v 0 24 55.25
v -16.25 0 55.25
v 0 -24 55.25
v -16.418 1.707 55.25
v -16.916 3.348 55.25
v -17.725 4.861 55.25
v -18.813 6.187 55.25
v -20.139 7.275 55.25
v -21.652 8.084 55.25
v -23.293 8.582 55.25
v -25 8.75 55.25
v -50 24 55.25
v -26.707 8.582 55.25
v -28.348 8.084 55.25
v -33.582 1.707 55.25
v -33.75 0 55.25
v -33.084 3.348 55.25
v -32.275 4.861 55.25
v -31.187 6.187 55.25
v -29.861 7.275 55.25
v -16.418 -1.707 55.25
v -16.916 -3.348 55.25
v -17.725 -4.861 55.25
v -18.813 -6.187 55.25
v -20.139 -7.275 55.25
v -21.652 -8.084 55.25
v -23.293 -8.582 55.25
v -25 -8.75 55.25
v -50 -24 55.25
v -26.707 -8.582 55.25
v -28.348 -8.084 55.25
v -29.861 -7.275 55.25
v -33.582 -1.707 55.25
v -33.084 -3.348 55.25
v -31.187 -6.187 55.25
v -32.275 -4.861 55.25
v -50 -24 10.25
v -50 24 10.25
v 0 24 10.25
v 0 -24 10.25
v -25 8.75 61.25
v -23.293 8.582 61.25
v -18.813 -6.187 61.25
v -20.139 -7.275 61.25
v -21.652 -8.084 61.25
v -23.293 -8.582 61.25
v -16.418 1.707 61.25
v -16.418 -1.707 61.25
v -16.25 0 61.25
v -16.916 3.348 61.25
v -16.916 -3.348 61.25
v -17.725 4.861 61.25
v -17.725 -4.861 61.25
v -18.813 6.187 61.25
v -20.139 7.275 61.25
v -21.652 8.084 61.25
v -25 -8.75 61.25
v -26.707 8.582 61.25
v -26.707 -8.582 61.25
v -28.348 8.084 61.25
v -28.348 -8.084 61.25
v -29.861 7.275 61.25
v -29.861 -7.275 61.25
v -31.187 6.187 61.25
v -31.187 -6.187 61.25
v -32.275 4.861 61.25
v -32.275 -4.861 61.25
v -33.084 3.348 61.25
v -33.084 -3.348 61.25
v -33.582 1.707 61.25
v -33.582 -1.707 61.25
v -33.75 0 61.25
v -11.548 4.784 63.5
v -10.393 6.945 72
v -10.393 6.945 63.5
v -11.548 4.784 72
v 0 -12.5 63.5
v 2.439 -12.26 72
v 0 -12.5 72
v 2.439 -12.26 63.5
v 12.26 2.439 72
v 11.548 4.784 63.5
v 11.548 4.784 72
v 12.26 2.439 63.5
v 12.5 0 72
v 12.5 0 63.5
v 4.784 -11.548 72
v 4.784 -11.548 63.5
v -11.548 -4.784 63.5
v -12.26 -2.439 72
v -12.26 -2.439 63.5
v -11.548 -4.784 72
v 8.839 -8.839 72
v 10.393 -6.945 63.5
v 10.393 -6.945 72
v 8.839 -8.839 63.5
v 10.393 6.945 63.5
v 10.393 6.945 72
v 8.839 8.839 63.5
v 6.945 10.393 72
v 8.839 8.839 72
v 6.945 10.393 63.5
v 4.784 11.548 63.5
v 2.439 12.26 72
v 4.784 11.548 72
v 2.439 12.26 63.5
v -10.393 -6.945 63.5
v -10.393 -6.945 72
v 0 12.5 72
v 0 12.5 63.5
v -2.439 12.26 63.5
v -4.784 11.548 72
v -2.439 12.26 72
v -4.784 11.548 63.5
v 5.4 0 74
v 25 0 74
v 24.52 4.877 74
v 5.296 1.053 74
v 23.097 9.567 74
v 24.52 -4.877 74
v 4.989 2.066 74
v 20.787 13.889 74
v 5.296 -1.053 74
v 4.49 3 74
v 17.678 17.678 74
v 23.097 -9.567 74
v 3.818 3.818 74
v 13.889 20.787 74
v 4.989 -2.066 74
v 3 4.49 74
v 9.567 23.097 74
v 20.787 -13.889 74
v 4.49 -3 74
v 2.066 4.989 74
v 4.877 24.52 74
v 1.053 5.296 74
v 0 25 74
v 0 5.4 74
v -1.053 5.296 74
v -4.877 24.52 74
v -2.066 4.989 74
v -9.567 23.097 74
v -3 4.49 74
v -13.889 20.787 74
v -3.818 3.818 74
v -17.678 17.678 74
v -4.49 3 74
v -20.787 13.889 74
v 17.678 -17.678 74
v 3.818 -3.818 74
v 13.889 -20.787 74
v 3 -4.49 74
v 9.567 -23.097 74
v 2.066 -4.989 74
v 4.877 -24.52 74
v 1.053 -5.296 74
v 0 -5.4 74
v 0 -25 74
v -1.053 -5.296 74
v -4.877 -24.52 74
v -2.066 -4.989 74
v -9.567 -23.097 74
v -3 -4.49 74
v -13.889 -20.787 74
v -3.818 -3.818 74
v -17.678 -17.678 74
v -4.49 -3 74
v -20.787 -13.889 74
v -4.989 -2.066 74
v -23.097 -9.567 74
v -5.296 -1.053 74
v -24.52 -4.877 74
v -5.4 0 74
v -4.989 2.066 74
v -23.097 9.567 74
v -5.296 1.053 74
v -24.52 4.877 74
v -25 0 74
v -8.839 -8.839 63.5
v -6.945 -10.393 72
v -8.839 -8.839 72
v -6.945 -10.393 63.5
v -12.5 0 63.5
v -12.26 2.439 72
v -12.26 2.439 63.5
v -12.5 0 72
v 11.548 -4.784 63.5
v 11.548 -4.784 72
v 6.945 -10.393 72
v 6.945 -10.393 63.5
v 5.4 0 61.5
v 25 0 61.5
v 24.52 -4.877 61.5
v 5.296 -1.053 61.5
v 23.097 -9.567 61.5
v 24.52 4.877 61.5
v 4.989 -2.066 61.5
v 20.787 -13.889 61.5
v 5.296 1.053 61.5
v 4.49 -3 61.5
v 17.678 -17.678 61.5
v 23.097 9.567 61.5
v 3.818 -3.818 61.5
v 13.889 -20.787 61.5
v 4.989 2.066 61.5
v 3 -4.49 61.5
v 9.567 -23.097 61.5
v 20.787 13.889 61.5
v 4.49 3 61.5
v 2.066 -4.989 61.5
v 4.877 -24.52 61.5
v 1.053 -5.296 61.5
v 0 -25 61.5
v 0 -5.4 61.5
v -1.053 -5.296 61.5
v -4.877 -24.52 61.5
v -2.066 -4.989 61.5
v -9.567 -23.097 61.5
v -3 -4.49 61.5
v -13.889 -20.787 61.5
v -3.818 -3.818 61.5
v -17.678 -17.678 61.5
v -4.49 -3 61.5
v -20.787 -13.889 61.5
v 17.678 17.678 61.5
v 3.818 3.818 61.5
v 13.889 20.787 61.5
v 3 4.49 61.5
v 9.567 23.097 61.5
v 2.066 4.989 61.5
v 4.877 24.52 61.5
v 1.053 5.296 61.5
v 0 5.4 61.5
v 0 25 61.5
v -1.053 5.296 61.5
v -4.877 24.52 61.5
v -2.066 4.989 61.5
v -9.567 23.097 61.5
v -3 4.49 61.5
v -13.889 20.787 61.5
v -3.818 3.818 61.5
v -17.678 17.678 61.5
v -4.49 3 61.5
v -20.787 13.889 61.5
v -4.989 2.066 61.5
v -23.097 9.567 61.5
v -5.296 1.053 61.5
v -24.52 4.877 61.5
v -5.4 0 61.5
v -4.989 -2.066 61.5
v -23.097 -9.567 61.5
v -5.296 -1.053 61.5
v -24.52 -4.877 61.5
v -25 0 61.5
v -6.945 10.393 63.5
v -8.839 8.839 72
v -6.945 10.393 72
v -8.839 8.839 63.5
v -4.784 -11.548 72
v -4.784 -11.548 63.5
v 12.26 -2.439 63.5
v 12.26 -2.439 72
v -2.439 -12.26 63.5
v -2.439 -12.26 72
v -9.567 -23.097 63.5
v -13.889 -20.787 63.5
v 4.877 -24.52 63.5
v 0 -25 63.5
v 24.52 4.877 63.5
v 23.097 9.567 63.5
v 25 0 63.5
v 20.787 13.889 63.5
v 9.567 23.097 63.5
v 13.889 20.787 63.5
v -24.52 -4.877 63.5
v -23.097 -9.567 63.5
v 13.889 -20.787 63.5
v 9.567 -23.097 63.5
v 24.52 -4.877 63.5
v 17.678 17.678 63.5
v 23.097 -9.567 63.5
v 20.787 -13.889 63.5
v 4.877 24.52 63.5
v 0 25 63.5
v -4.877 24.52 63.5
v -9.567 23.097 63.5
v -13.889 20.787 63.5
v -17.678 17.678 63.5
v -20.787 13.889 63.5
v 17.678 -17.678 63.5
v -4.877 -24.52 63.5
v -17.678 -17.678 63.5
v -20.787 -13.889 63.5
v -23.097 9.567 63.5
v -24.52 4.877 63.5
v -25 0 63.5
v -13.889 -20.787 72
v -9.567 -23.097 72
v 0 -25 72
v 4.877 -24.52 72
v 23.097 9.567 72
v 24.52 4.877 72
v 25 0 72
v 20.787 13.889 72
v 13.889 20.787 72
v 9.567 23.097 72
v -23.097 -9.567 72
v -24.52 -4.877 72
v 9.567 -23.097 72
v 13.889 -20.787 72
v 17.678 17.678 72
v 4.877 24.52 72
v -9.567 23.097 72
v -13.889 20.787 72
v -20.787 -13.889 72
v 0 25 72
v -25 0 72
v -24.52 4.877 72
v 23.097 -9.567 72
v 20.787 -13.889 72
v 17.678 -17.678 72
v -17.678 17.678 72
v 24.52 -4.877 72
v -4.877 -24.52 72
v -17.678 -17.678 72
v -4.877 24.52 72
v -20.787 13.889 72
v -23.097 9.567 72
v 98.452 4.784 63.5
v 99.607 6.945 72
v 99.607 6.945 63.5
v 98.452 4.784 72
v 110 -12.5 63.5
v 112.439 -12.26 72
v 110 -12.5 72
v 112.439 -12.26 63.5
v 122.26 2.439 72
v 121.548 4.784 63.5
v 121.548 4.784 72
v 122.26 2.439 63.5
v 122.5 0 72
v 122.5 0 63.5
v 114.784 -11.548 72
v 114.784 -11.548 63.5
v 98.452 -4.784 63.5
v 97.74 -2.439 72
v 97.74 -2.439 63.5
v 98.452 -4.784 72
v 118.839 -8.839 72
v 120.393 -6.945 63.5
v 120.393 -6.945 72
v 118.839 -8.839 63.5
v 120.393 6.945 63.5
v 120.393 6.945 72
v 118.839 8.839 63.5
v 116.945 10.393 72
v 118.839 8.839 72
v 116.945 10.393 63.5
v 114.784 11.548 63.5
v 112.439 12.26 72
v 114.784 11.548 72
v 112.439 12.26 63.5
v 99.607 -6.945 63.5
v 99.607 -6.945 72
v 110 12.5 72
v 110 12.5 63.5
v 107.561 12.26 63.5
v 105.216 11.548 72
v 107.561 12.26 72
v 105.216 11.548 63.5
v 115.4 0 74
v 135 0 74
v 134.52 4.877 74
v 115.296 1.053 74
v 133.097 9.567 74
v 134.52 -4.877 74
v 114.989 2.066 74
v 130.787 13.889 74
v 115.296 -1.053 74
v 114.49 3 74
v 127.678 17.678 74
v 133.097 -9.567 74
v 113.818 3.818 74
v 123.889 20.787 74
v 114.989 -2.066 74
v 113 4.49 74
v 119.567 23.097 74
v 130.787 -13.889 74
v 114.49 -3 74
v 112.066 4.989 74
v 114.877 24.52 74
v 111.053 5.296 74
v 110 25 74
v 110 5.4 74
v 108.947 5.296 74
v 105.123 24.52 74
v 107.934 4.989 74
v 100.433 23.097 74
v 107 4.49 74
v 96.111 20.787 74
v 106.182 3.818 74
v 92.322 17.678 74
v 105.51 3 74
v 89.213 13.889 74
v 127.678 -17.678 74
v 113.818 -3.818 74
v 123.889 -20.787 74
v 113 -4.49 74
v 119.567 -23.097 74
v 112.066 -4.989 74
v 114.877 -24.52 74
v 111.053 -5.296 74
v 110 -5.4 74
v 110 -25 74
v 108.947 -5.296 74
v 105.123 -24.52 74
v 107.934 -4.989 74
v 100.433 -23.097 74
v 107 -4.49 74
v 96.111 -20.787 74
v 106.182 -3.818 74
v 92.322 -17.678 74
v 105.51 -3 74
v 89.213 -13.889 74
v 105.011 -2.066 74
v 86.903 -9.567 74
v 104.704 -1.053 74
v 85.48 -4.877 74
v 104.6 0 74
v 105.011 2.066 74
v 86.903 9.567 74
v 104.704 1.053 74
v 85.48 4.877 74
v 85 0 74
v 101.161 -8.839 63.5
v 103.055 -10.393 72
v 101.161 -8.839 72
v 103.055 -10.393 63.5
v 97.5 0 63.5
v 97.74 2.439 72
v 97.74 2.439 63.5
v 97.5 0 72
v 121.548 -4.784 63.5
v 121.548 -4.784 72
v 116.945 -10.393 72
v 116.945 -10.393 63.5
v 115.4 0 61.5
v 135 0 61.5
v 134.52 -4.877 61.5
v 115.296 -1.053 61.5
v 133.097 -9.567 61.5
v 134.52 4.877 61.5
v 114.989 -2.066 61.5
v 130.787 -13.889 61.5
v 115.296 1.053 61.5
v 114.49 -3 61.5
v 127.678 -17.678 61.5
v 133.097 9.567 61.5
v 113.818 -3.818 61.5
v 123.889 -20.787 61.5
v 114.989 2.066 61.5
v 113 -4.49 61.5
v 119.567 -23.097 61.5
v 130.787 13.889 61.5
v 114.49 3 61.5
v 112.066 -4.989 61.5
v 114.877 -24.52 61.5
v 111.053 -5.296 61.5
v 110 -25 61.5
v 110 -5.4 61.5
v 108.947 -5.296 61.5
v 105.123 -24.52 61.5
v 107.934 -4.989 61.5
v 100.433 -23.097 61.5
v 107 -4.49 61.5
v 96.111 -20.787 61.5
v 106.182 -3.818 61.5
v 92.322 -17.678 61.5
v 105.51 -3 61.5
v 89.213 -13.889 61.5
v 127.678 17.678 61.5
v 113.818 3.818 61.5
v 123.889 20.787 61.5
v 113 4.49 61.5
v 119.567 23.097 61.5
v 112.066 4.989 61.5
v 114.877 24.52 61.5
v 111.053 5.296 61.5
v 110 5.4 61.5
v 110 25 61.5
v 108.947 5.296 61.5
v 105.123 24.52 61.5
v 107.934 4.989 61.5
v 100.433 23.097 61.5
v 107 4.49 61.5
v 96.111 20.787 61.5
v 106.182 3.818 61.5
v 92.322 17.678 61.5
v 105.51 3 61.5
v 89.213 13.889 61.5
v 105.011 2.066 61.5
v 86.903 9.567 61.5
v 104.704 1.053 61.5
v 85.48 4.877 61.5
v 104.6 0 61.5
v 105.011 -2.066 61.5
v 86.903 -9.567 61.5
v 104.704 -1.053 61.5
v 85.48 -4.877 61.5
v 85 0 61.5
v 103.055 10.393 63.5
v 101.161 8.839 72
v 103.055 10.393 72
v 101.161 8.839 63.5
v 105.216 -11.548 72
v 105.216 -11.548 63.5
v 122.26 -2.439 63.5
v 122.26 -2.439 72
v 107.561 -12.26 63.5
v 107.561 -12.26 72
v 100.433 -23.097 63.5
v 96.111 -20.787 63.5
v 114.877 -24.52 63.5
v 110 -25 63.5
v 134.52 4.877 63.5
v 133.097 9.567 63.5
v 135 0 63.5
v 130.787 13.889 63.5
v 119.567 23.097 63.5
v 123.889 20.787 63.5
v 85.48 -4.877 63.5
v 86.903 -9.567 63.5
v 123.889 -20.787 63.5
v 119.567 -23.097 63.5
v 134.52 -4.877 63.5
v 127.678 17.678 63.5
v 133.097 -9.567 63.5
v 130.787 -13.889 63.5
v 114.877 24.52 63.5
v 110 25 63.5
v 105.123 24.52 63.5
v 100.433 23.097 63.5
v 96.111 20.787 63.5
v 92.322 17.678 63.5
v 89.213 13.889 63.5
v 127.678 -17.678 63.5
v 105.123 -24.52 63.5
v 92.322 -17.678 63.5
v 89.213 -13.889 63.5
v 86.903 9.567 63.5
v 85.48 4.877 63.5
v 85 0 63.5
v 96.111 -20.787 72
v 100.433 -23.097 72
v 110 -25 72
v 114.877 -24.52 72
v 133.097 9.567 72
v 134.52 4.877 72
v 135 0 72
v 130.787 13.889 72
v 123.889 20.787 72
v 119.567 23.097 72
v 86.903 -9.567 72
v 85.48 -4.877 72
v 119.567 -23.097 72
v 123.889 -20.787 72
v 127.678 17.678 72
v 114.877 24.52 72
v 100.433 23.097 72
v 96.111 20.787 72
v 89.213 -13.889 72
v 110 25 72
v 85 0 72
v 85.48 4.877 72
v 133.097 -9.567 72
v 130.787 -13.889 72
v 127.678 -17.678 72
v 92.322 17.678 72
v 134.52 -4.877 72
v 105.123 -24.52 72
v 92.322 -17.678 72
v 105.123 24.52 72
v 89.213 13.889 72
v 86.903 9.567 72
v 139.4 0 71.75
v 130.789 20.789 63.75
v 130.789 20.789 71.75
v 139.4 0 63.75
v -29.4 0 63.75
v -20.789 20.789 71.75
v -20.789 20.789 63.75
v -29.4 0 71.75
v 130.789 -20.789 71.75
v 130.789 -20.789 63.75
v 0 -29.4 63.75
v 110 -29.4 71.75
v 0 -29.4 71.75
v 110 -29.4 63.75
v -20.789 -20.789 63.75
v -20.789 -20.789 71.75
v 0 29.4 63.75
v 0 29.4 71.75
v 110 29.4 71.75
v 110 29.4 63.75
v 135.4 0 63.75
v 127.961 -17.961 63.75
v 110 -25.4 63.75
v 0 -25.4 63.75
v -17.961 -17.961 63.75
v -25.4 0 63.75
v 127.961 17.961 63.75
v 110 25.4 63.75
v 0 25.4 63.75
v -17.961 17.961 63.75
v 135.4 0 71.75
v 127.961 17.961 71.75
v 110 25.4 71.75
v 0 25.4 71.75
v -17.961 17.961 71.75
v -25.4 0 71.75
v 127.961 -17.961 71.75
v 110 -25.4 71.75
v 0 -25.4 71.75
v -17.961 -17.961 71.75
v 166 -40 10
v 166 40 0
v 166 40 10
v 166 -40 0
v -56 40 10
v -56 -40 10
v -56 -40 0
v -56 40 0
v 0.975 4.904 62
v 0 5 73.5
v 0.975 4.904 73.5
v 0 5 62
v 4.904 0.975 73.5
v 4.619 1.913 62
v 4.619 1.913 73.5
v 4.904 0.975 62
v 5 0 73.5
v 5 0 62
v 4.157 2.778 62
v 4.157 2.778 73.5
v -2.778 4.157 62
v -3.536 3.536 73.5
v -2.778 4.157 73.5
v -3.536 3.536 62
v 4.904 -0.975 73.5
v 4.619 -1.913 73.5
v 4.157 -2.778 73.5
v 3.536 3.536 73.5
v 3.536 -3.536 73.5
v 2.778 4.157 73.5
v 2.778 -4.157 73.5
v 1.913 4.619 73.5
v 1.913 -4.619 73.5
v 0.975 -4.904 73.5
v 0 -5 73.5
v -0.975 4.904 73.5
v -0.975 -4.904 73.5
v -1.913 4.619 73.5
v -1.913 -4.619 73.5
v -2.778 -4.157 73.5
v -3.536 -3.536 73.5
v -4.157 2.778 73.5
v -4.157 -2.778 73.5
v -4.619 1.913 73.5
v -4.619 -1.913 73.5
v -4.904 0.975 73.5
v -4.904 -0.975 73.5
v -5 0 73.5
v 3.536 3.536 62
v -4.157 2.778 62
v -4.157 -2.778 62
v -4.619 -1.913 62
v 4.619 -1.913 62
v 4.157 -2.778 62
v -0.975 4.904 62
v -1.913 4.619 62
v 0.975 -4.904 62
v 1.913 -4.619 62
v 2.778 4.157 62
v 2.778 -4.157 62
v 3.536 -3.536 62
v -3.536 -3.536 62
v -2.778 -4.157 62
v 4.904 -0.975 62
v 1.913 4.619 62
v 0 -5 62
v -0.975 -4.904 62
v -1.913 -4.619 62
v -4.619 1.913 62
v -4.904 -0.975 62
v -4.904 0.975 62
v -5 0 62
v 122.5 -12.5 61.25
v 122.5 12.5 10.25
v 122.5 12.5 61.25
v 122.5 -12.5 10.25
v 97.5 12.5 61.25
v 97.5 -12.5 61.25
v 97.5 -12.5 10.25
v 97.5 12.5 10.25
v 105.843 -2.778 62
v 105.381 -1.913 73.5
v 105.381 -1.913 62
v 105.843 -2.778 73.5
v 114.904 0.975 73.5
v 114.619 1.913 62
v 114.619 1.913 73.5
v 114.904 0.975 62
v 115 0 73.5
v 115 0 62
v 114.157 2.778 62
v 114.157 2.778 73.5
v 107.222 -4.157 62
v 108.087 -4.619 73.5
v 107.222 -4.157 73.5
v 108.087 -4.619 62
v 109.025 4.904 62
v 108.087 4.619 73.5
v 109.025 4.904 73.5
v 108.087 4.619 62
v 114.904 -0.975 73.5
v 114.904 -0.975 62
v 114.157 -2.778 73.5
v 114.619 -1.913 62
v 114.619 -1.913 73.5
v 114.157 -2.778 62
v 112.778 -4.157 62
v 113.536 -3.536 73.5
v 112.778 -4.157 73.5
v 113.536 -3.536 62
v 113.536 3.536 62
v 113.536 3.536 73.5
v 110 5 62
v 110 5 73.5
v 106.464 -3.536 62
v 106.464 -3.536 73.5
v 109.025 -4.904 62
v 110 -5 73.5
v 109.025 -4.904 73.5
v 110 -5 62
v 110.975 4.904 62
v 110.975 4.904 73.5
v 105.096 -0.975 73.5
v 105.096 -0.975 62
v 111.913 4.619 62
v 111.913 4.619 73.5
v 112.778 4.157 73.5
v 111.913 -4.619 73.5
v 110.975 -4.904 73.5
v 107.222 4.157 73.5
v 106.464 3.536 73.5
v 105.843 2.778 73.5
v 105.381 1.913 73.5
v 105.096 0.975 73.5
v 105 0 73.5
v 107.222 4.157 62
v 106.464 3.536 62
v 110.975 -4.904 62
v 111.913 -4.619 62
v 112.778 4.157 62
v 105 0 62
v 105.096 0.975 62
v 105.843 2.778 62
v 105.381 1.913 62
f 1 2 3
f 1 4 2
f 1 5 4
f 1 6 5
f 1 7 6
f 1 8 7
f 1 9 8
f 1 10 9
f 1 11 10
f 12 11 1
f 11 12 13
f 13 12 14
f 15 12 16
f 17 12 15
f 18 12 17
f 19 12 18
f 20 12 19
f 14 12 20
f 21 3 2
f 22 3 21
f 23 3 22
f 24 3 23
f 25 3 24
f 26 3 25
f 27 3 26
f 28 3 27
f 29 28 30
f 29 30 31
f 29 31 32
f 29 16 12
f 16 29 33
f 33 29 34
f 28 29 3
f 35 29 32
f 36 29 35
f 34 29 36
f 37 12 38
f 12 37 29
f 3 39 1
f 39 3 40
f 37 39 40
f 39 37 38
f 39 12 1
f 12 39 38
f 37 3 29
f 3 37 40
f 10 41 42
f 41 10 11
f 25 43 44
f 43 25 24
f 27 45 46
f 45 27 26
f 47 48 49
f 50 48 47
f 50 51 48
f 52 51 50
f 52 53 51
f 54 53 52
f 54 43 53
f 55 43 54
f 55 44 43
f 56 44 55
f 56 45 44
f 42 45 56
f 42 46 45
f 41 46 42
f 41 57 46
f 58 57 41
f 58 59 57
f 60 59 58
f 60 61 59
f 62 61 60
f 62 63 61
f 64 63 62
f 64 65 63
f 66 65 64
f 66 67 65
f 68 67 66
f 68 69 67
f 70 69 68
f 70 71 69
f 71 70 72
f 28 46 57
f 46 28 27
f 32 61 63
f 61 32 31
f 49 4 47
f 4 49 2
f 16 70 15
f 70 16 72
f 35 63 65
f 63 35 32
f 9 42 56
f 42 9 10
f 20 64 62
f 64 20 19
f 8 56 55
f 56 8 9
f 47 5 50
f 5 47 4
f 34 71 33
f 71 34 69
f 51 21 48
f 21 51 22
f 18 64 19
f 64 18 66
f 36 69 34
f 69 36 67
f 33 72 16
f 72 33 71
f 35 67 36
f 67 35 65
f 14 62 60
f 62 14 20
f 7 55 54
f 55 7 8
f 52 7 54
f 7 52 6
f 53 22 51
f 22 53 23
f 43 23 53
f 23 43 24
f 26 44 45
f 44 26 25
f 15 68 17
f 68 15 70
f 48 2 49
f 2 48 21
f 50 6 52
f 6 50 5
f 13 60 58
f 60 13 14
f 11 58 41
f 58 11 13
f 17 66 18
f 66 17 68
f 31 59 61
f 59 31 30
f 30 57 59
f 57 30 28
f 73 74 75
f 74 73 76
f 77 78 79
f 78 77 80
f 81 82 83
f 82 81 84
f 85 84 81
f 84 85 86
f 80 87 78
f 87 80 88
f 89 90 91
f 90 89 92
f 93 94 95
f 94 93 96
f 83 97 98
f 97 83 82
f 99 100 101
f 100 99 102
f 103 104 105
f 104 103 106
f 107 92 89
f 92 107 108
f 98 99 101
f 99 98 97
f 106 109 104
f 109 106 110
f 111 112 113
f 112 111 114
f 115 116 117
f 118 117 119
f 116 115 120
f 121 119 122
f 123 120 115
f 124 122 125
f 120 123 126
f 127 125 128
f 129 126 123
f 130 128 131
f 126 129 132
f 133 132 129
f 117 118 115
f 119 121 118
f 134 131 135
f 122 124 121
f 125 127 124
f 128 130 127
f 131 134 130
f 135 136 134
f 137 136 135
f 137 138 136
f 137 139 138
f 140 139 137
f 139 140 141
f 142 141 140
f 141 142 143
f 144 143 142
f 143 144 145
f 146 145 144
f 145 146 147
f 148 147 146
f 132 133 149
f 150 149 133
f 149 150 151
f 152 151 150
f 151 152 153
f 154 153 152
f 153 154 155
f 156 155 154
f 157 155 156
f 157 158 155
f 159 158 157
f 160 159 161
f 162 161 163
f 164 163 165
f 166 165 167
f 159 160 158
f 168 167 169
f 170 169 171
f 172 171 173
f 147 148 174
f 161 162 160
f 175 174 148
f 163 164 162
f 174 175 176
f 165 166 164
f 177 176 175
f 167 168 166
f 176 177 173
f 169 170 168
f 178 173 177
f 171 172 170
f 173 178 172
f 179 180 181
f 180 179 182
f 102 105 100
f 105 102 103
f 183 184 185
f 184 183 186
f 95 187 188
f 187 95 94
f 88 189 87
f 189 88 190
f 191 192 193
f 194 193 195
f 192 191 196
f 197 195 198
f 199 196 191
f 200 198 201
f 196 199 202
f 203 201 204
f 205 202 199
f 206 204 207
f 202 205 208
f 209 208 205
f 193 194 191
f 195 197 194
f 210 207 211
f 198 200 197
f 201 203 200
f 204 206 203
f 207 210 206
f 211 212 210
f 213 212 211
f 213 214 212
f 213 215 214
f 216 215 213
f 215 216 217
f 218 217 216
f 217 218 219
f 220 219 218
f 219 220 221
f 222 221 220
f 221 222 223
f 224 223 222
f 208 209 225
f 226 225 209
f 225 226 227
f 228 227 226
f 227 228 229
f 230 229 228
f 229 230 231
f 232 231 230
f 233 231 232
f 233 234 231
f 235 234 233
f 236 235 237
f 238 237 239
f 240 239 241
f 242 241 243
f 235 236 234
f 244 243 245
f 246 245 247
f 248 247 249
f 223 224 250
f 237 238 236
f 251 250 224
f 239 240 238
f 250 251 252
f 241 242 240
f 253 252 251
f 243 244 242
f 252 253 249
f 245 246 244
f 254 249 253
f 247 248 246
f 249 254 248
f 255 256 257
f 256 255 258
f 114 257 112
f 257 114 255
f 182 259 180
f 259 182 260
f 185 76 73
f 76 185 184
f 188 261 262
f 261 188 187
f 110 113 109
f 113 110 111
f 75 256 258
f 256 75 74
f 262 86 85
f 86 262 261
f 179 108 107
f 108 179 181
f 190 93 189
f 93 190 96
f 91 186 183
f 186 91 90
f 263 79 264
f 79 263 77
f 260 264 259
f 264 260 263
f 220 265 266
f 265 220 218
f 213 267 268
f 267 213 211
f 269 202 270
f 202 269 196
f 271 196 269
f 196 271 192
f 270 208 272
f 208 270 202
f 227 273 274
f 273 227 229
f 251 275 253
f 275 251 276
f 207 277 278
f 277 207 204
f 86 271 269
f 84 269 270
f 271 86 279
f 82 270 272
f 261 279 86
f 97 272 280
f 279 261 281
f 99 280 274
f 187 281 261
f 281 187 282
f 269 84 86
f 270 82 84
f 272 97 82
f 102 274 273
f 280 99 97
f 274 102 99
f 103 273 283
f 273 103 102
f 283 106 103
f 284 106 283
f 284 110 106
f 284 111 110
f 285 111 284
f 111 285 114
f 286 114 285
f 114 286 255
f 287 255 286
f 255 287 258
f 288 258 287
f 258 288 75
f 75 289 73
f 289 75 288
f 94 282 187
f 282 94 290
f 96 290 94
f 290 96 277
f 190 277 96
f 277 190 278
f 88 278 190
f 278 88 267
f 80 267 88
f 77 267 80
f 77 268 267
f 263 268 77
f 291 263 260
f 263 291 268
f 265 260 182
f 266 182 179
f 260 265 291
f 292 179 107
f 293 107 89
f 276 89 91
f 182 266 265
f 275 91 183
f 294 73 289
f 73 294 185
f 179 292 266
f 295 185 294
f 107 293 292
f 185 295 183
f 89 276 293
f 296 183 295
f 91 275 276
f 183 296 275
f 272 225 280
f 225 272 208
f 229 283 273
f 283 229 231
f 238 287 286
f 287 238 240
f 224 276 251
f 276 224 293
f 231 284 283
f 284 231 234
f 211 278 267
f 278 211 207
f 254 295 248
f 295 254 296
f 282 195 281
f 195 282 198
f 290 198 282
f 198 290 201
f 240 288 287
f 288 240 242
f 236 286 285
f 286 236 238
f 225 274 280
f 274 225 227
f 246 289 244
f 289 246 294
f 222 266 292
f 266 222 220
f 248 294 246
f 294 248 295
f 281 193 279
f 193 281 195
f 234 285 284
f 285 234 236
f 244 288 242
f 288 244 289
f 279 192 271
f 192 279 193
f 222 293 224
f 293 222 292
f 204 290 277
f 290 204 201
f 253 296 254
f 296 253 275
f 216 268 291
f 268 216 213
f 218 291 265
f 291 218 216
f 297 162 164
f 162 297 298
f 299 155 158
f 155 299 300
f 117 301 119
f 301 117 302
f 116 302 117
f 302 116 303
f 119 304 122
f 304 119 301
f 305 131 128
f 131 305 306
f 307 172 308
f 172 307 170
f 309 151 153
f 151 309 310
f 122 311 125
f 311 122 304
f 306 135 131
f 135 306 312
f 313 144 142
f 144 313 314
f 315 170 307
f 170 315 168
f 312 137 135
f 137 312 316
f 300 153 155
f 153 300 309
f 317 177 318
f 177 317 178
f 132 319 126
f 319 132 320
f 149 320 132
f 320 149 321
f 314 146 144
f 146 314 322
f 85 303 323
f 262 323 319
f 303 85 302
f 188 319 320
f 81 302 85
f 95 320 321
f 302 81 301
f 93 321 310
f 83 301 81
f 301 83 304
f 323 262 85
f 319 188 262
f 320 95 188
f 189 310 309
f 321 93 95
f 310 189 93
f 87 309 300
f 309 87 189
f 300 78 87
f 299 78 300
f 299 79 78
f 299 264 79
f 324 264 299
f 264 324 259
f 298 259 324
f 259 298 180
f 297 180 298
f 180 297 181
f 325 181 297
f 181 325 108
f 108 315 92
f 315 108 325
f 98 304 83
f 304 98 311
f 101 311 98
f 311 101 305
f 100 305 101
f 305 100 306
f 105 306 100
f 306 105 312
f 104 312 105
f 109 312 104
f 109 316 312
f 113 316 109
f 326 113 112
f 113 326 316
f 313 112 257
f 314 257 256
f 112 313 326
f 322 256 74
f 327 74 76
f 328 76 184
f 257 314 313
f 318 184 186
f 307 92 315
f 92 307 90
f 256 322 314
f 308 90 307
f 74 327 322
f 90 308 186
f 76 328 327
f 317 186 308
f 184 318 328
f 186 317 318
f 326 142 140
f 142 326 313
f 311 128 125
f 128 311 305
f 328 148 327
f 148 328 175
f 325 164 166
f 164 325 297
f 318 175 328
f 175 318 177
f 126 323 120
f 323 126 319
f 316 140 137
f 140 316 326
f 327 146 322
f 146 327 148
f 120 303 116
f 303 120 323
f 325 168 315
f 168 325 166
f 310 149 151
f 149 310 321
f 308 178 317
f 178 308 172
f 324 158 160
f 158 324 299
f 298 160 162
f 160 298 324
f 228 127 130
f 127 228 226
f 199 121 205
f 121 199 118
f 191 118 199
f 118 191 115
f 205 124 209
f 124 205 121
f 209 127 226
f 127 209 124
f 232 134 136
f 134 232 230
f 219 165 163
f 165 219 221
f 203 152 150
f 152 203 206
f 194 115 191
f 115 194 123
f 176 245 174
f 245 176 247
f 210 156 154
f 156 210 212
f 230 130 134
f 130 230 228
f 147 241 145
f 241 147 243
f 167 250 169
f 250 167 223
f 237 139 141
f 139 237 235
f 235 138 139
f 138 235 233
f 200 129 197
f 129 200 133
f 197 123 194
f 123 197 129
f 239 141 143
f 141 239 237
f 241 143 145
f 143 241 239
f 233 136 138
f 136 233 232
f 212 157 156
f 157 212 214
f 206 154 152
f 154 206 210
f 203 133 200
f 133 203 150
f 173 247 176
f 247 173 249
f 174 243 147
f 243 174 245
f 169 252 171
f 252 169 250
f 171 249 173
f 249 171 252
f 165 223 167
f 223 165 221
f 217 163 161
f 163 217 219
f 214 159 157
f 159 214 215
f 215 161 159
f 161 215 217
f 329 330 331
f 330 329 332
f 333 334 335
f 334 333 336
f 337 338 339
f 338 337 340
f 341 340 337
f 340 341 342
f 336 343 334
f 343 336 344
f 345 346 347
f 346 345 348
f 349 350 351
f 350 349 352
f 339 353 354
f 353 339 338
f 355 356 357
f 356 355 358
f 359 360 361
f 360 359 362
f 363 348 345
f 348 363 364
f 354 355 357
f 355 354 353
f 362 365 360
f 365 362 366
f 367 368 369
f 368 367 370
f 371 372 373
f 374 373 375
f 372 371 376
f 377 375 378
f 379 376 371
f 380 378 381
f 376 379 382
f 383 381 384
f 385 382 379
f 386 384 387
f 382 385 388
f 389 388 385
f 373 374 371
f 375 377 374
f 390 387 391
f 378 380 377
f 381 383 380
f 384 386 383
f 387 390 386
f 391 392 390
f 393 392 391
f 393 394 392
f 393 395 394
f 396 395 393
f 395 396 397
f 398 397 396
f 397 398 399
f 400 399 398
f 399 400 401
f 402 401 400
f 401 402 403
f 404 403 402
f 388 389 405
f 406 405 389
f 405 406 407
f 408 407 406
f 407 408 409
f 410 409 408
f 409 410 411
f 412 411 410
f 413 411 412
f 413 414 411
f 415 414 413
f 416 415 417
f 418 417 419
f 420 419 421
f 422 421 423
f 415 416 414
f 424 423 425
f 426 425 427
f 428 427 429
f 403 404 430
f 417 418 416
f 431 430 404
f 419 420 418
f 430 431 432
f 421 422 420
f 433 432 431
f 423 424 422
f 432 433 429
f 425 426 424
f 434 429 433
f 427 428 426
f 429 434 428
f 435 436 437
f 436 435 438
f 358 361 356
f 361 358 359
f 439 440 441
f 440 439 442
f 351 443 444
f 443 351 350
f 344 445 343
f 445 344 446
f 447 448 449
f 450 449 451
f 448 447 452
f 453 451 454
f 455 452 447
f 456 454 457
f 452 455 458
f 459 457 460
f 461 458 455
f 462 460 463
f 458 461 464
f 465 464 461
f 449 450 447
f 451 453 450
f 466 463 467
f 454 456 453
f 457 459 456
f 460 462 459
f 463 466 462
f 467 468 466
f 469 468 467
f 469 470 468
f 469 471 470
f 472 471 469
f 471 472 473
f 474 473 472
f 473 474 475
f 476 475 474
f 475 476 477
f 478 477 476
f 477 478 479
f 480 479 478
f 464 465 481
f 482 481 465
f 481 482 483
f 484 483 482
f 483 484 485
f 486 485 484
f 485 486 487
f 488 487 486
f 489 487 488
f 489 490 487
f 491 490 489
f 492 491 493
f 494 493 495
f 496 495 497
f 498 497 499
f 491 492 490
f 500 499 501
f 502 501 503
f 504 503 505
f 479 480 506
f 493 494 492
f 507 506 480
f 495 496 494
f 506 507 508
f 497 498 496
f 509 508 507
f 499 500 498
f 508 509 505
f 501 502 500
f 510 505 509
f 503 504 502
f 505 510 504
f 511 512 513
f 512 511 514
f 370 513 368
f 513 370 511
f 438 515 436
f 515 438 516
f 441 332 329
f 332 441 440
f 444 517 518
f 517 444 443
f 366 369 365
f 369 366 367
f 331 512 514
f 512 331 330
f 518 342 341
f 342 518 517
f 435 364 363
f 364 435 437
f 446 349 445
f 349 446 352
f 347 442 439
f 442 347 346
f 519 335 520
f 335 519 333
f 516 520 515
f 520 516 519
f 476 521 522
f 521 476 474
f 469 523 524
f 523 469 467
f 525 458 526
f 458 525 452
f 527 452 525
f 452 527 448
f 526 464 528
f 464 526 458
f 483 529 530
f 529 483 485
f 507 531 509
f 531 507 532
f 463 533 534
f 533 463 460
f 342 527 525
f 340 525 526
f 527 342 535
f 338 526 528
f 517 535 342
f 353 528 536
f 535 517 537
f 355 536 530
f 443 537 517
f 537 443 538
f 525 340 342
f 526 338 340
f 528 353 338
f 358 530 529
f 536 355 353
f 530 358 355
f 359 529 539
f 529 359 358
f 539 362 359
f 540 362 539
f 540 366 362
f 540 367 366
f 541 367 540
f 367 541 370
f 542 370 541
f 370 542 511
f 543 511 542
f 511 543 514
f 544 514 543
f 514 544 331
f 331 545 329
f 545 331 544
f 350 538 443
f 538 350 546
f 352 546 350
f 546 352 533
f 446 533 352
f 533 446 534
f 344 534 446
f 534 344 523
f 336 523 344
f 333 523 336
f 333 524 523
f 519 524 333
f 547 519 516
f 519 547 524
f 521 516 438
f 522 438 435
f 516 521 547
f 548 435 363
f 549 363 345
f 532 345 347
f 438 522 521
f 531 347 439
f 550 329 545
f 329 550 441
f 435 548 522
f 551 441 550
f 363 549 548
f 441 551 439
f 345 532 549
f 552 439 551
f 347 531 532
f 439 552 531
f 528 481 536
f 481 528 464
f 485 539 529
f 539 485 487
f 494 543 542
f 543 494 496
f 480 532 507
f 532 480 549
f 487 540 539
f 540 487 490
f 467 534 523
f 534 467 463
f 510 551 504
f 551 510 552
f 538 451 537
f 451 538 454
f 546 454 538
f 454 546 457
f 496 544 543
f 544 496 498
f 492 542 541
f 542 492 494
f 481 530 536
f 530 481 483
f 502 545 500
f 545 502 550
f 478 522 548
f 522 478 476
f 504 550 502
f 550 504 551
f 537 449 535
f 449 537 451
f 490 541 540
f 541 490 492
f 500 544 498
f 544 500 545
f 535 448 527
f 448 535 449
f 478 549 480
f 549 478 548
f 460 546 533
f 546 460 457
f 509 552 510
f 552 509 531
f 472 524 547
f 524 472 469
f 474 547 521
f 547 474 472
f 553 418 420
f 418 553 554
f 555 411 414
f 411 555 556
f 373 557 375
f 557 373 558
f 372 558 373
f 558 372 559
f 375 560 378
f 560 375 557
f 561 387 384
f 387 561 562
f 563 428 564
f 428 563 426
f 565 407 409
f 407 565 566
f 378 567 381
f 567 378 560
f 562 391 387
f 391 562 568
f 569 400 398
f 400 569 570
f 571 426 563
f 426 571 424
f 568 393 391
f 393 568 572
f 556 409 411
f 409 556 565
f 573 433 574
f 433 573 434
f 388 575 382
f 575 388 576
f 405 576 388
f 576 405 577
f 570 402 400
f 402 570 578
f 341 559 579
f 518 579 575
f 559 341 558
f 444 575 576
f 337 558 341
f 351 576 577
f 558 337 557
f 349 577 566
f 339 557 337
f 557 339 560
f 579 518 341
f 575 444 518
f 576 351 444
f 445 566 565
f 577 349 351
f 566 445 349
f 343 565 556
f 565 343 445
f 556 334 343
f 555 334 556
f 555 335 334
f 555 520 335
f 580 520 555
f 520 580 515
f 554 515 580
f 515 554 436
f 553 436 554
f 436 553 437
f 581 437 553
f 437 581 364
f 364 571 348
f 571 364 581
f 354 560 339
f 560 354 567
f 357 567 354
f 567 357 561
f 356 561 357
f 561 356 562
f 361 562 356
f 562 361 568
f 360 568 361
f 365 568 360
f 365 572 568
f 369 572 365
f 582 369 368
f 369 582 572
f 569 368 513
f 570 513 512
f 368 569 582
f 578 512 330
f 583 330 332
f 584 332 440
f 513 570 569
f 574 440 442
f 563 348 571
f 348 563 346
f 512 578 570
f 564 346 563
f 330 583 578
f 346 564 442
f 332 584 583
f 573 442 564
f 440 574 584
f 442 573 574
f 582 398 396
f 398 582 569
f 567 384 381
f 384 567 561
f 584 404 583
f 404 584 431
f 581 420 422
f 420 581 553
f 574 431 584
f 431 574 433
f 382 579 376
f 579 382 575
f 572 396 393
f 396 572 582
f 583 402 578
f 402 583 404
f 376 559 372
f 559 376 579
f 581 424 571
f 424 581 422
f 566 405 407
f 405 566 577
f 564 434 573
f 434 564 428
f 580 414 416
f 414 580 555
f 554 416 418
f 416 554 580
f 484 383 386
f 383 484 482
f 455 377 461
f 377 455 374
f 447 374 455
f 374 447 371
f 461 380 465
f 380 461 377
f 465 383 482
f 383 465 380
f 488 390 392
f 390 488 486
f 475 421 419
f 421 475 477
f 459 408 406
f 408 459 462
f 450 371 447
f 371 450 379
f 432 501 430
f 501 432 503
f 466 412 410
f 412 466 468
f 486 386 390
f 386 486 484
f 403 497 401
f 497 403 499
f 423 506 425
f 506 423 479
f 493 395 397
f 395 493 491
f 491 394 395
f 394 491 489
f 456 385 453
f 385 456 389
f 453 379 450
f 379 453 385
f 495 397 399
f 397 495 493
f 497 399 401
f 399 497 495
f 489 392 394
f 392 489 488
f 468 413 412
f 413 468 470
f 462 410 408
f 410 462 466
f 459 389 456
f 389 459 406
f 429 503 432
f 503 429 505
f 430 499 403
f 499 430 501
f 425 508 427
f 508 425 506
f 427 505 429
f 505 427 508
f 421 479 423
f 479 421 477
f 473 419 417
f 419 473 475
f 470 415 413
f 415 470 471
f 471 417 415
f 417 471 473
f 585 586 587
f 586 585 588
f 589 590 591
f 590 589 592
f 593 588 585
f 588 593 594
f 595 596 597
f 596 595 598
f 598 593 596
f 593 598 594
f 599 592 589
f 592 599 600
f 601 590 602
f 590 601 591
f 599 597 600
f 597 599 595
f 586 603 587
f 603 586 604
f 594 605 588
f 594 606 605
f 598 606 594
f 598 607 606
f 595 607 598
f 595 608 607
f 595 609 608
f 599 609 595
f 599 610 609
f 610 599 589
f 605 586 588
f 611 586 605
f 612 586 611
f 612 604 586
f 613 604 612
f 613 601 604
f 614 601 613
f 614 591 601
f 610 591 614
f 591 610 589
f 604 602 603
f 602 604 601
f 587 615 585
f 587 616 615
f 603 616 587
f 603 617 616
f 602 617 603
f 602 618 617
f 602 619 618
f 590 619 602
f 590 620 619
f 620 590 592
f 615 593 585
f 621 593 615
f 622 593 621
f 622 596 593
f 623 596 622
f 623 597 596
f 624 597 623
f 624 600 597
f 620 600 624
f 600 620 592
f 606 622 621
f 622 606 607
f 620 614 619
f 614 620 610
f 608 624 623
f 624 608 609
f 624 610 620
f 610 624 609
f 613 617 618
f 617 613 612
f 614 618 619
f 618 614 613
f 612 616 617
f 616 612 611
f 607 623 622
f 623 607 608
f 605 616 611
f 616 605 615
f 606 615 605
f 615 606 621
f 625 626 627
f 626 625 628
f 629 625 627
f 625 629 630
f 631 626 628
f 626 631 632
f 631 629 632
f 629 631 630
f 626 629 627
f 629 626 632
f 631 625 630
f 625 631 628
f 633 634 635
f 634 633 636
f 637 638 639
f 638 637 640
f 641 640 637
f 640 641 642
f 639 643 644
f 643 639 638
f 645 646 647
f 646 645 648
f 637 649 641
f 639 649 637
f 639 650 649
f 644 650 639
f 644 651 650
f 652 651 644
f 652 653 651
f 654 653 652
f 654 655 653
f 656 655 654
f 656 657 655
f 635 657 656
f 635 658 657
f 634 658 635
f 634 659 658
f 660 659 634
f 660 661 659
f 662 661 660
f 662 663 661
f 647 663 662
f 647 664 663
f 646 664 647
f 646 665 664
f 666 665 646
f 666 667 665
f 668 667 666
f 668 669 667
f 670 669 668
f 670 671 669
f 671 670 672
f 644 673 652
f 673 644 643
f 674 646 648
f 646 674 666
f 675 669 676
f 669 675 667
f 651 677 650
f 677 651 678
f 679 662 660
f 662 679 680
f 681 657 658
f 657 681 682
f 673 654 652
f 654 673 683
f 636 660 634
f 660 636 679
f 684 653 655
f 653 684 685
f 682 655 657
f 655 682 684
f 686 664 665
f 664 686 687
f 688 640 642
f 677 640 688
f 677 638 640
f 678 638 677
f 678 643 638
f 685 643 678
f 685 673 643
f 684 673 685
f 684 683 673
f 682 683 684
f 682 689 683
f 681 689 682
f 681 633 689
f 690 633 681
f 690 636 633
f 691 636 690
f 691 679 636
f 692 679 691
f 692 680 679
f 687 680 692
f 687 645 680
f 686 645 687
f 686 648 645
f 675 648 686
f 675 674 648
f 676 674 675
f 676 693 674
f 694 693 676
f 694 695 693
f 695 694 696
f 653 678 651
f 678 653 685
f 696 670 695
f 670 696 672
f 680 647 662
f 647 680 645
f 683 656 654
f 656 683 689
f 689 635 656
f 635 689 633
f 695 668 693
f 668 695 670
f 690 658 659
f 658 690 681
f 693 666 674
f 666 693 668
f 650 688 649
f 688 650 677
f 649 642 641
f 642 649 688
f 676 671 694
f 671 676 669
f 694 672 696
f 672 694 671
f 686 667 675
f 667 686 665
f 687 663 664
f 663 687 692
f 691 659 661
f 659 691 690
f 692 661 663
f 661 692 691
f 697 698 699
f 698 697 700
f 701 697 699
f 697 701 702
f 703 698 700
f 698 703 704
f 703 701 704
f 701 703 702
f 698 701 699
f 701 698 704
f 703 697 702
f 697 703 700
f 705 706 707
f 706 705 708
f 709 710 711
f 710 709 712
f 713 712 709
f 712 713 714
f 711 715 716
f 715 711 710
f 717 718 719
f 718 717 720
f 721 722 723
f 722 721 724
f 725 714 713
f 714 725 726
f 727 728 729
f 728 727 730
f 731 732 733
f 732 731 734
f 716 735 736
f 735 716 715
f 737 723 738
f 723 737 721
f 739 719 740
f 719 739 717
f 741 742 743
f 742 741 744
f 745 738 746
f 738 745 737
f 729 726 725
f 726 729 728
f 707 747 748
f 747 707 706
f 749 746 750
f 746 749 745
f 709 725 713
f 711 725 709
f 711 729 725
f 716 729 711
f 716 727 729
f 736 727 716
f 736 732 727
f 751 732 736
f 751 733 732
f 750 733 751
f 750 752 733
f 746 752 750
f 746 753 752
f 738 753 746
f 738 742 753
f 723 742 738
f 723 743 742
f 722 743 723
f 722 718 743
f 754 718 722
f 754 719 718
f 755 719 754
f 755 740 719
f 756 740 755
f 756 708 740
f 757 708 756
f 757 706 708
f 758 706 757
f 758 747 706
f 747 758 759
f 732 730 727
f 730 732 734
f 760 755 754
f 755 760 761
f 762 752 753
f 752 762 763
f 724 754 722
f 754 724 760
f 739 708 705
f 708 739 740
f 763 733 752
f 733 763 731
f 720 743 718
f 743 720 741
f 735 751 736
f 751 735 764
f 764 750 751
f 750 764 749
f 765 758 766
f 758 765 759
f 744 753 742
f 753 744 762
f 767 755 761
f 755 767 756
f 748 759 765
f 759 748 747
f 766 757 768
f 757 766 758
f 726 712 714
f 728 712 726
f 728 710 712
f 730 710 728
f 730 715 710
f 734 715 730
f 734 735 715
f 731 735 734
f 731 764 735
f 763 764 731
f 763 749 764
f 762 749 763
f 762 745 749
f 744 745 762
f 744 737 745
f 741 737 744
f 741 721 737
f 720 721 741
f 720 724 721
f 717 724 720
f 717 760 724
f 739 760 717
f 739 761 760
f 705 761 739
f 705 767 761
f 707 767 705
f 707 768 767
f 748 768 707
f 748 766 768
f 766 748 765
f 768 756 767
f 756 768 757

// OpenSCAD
$fn = 32;

// ------------------------------------------------------------------------
// Motor belt drive: span 110 mm, pulleys d50, belt 8 mm wide
// Every part is its own module, assembly() places every instance.
// ------------------------------------------------------------------------

// --- part 1 ---
module base_plate() {
  difference() {
    translate([-111, -40, 0]) cube([222, 80, 10]);
  }
}

// --- part 2 ---
module motor() {
  union() {
    translate([-22.5, -24, 0]) cube([45, 48, 50]);
    translate([25.5, 0, 25]) rotate([0, 90, 0]) cylinder(h = 6, d = 17.5, center = true);
  }
}

// --- part 3 ---
module drive_shaft() {
  translate([0, 0, -5.75]) cylinder(h = 11.5, d = 10);
}

// --- part 4 ---
module pulley_drive() {
  difference() {
    union() {
      cylinder(h = 12.5, d = 25);
      cylinder(h = 2, d = 50);
      translate([0, 0, 10.5]) cylinder(h = 2, d = 50);
    }
    translate([0, 0, -1]) cylinder(h = 14.5, d = 10.8);
  }
}

// --- part 5 ---
module idler_post() {
  translate([-12.5, -12.5, 0]) cube([25, 25, 51]);
}

// --- part 6 ---
module driven_shaft() {
  translate([0, 0, -5.75]) cylinder(h = 11.5, d = 10);
}

// --- part 7 ---
module pulley_driven() {
  difference() {
    union() {
      cylinder(h = 12.5, d = 25);
      cylinder(h = 2, d = 50);
      translate([0, 0, 10.5]) cylinder(h = 2, d = 50);
    }
    translate([0, 0, -1]) cylinder(h = 14.5, d = 10.8);
  }
}

// --- part 8 ---
module drive_belt() {
  difference() {
    linear_extrude(height = 8) polygon(points = concat([for (a = [90 : 45 : 270]) [29.4 * cos(a), 29.4 * sin(a)]], [for (a = [270 : 45 : 450]) [110 + 29.4 * cos(a), 29.4 * sin(a)]]));
    translate([0, 0, -1]) linear_extrude(height = 10) polygon(points = concat([for (a = [90 : 45 : 270]) [25.4 * cos(a), 25.4 * sin(a)]], [for (a = [270 : 45 : 450]) [110 + 25.4 * cos(a), 25.4 * sin(a)]]));
  }
}

// --- assembly ---
module assembly() {
  color([0.80, 0.24, 0.20]) translate([55, 0, 0]) rotate([0, 0, 0]) base_plate();
  color([0.20, 0.45, 0.75]) translate([0, 0, 32.75]) rotate([0, 270, 0]) motor();
  color([0.25, 0.62, 0.32]) translate([0, 0, 67.75]) rotate([0, 0, 0]) drive_shaft();
  color([0.92, 0.70, 0.18]) translate([0, 0, 61.5]) rotate([0, 0, 0]) pulley_drive();
  color([0.58, 0.35, 0.70]) translate([110, 0, 10.25]) rotate([0, 0, 0]) idler_post();
  color([0.16, 0.66, 0.66]) translate([110, 0, 67.75]) rotate([0, 0, 0]) driven_shaft();
  color([0.85, 0.48, 0.18]) translate([110, 0, 61.5]) rotate([0, 0, 0]) pulley_driven();
  color([0.55, 0.60, 0.65]) translate([0, 0, 63.75]) rotate([0, 0, 0]) drive_belt();
}

assembly();
